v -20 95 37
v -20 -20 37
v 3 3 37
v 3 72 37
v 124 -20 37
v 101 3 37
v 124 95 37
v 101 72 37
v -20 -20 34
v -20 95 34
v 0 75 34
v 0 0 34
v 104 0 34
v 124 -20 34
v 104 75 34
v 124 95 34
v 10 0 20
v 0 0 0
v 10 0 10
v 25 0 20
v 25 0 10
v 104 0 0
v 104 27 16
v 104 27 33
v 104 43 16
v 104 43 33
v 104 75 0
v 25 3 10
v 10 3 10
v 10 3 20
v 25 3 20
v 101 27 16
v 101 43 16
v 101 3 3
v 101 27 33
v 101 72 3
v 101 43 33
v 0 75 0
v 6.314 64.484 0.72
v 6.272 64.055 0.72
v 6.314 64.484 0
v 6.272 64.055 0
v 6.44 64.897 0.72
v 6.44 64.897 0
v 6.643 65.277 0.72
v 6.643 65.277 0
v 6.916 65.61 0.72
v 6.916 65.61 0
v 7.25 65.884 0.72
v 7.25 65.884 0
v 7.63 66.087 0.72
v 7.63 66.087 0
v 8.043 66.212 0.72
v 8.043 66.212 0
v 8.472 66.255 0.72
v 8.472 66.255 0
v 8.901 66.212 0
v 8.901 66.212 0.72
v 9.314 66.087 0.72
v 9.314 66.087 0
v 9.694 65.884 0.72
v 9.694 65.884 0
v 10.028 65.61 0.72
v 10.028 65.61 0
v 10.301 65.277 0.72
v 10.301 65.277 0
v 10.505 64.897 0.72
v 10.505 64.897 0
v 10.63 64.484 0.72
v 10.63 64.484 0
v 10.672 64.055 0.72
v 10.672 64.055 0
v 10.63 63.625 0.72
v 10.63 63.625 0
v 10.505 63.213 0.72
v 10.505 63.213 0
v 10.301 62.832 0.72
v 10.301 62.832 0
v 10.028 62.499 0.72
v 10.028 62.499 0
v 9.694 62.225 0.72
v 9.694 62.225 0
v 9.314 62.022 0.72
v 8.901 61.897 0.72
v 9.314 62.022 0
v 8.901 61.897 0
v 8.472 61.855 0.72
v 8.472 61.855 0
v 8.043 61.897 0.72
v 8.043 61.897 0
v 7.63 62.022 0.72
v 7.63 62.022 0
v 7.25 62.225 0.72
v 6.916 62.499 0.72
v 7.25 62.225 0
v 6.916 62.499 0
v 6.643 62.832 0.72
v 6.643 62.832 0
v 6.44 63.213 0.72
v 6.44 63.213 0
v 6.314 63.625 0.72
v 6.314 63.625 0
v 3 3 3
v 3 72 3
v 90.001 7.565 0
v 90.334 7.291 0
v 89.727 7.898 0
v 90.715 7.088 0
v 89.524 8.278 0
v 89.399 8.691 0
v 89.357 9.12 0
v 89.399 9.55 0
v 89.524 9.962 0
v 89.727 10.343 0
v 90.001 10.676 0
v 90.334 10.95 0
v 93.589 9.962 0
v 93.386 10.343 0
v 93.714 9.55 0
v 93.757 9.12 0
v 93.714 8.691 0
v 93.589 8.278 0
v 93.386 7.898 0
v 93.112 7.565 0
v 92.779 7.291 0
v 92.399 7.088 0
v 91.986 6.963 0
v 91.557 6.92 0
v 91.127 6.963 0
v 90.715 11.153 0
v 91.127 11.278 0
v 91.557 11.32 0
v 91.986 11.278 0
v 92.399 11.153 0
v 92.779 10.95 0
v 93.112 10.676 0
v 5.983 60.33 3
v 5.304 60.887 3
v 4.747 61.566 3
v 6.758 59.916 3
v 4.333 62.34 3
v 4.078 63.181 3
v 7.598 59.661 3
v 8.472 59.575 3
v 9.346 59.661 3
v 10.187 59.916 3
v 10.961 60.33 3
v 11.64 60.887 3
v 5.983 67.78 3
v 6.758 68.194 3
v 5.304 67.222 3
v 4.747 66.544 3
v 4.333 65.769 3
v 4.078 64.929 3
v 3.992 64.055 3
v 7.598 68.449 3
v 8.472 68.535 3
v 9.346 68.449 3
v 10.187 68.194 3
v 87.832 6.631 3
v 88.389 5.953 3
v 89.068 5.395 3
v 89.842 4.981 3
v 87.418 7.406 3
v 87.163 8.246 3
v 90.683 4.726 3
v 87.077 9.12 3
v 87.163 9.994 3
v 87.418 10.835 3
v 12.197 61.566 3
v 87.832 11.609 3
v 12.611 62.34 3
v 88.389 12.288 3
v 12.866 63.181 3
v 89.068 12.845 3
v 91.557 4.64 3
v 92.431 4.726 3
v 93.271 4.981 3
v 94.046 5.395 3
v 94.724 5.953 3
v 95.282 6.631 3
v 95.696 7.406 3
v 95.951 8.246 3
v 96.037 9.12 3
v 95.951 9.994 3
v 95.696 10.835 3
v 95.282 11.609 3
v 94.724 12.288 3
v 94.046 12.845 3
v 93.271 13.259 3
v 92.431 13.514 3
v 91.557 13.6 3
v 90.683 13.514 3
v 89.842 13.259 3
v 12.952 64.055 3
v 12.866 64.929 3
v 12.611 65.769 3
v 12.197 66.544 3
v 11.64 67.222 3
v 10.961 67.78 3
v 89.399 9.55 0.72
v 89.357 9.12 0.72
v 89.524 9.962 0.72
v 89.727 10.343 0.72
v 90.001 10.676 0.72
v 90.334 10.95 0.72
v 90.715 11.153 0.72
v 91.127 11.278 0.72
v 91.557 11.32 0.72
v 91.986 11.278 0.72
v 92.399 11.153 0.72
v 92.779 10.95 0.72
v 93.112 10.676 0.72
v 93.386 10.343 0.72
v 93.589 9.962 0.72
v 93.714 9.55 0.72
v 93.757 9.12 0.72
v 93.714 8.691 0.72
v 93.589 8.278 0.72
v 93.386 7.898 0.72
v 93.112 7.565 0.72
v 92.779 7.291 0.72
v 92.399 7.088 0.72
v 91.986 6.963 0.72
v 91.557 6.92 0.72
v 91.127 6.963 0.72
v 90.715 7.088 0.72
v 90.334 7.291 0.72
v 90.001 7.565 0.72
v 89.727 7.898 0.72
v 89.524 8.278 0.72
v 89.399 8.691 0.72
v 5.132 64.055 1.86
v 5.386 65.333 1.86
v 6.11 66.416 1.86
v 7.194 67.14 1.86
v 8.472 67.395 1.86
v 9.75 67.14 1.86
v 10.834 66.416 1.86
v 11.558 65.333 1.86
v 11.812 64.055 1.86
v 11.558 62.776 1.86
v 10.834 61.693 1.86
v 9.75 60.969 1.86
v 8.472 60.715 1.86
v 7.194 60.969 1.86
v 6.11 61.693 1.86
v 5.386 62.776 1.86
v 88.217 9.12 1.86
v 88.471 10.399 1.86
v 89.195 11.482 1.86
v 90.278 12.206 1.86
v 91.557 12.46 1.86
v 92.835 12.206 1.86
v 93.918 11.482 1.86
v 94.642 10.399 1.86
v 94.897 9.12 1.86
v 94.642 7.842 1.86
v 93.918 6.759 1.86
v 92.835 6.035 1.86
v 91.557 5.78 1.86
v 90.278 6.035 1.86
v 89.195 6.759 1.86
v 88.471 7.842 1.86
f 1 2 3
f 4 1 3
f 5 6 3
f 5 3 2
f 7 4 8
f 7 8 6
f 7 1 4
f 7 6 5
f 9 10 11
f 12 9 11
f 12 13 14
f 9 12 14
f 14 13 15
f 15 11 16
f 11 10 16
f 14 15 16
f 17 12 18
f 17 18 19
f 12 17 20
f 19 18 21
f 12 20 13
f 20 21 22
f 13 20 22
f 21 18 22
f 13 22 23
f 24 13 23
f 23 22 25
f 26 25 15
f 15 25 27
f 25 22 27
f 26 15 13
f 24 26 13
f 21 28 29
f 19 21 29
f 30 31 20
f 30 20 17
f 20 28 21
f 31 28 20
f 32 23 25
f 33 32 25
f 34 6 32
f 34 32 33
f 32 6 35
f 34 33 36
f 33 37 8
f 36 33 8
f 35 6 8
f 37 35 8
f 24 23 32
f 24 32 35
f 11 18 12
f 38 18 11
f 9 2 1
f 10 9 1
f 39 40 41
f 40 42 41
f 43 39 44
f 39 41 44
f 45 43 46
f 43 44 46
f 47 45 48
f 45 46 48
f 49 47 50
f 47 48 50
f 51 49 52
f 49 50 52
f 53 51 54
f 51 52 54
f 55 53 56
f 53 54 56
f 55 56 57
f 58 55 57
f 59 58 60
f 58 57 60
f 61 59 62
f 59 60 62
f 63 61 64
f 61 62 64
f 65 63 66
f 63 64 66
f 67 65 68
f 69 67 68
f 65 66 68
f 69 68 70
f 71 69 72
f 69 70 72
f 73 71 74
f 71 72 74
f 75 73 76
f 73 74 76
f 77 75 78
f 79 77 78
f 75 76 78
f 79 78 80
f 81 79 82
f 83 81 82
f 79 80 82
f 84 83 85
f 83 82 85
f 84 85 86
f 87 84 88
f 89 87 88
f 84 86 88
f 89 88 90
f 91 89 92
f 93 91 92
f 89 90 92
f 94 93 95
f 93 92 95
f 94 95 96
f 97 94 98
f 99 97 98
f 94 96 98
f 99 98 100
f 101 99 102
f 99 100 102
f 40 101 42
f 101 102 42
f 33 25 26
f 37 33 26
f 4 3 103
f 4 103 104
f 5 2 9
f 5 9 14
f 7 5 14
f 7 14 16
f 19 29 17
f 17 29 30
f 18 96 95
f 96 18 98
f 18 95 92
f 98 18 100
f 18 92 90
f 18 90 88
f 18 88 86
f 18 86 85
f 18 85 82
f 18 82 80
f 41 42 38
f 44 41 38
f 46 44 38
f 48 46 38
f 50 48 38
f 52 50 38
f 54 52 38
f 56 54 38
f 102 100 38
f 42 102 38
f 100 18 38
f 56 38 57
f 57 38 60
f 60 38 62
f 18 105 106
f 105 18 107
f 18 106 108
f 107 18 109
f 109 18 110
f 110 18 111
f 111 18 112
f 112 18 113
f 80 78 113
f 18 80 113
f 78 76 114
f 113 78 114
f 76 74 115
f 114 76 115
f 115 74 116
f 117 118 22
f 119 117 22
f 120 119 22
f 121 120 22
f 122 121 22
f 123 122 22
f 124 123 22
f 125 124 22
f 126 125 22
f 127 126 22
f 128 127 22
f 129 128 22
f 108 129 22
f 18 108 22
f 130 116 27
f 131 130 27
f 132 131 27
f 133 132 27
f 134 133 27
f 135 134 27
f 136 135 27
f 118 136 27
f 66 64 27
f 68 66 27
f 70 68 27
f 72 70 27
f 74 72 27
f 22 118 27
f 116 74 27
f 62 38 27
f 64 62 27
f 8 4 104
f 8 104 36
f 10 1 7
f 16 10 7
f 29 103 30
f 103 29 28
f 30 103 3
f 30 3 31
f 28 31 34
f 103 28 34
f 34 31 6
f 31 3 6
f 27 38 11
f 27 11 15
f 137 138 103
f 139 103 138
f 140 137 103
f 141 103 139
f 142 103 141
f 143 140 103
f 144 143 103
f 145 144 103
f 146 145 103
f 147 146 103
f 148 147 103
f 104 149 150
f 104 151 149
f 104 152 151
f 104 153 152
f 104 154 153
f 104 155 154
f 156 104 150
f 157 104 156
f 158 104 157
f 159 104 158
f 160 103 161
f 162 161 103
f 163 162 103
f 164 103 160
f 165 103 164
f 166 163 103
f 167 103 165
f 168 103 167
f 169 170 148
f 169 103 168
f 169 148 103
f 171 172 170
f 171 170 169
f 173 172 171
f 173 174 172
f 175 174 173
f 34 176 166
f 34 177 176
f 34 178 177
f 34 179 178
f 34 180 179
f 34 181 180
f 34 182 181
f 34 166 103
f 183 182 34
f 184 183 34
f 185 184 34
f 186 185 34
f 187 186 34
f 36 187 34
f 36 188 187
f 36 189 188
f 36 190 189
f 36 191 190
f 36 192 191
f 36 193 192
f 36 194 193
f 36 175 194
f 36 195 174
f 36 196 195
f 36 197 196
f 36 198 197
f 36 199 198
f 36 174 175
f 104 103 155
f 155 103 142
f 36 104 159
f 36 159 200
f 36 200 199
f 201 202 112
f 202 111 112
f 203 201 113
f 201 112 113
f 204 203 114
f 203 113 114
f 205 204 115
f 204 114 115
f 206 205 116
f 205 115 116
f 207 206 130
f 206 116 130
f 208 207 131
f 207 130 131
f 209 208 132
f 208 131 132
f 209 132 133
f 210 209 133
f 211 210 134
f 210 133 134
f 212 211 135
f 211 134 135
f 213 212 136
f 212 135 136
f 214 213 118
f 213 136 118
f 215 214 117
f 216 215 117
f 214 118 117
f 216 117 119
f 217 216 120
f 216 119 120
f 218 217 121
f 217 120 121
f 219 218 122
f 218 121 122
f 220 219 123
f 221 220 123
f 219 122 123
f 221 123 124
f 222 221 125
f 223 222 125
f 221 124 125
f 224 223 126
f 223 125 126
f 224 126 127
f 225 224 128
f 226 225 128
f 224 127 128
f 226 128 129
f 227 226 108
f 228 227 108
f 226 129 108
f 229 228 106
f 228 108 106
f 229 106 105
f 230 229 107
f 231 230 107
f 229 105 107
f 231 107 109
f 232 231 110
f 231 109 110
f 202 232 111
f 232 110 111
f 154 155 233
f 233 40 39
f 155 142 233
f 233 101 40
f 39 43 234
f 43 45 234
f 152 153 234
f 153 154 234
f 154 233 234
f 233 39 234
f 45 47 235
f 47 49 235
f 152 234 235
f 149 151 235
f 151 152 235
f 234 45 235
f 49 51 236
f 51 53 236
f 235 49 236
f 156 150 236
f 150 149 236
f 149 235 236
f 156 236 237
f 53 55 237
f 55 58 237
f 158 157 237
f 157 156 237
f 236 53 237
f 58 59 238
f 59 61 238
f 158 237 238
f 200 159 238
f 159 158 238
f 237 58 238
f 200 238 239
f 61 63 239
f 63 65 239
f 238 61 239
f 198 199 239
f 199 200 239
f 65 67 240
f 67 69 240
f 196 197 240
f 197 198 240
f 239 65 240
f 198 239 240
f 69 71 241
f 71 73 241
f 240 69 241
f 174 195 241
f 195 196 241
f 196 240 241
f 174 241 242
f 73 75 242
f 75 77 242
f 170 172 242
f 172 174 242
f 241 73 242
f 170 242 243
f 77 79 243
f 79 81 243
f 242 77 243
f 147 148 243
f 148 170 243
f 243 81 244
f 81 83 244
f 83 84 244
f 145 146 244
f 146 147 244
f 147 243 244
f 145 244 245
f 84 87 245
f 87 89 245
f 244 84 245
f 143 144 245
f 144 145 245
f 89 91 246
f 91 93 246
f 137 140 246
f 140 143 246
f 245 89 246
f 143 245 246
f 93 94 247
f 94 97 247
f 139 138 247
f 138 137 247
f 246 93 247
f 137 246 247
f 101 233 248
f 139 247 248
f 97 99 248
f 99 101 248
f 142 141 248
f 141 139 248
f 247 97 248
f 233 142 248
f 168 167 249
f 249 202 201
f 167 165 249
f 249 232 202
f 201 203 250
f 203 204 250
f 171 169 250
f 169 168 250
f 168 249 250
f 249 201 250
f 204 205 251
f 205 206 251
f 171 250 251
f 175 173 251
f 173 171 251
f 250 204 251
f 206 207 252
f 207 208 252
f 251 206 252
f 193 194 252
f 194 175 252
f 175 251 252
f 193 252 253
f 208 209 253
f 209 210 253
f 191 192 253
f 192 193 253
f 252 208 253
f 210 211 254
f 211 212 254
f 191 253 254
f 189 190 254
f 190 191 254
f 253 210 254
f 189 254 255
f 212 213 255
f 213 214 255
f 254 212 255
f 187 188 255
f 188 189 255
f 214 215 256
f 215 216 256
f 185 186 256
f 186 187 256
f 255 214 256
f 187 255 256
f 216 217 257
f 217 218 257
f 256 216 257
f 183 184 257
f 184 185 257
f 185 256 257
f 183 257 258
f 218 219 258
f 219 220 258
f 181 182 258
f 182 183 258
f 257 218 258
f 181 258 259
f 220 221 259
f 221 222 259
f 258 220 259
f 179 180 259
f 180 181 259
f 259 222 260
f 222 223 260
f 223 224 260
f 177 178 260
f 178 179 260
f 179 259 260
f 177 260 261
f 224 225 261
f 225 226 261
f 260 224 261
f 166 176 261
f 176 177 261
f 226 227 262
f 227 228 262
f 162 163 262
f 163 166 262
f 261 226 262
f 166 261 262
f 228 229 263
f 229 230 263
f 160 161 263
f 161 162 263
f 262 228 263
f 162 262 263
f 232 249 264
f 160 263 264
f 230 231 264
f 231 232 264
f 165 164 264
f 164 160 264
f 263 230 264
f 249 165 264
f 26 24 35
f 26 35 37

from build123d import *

# Parameters (mm, degrees)
F0_W           = 104
F0_H           = 75
F1_DEPTH       = 37
F2_T           = -3
F4_D           = 4.4
F4_CSINK_D     = 8.96
F4_CSINK_ANGLE = 90
F5_D           = 4.4
F5_CSINK_D     = 8.96
F5_CSINK_ANGLE = 90
F6_W           = 15
F6_H           = 10
F7_DEPTH       = 4
F8_W           = 144
F8_H           = 115
F9_DEPTH       = 3
F10_W          = 98
F10_H          = 69
F11_DEPTH      = 3
F12_W          = 16
F12_H          = 17
F13_DEPTH      = 3


with BuildPart() as f1:
    # F0 (on Top) → F1 (new body)
    with BuildSketch(Plane.XY):
        with Locations((52, 37.5)):
            Rectangle(F0_W, F0_H)
    extrude(amount=F1_DEPTH)

    # F2
    f2_openings = [f1.faces().sort_by_distance(p)[0] for p in [
        (52, 37.5, 37),
    ]]
    offset(amount=F2_T, openings=f2_openings)

    # F4 (through all)
    with Locations(Plane.XY.offset(3)):
        with Locations((8.4720822051, 64.054608345)):
            CounterSinkHole(F4_D / 2, F4_CSINK_D / 2, counter_sink_angle=F4_CSINK_ANGLE)

    # F5 (through all)
    with Locations(Plane.XY.offset(3)):
        with Locations((91.5566533804, 9.1203558259)):
            CounterSinkHole(F5_D / 2, F5_CSINK_D / 2, counter_sink_angle=F5_CSINK_ANGLE)

    # F6 (on face) → F7 (cut)
    with BuildSketch(Plane(origin=(0, 3, 0), x_dir=(-1, 0, 0), z_dir=(0, 1, 0))):
        with Locations((-17.5, 15)):
            Rectangle(F6_W, F6_H)
    extrude(amount=-F7_DEPTH, mode=Mode.SUBTRACT)

    # F8 (on face) → F9 (join)
    with BuildSketch(Plane.XY.offset(37)):
        with Locations((52, 37.5)):
            Rectangle(F8_W, F8_H)
    extrude(amount=-F9_DEPTH)

    # F10 (on face) → F11 (cut)
    with BuildSketch(Plane.XY.offset(37)):
        with Locations((52, 37.5)):
            Rectangle(F10_W, F10_H)
    extrude(amount=-F11_DEPTH, mode=Mode.SUBTRACT)

    # F12 (on face) → F13 (cut)
    with BuildSketch(Plane.YZ.offset(104)):
        with Locations((35, 24.5)):
            Rectangle(F12_W, F12_H)
    extrude(amount=-F13_DEPTH, mode=Mode.SUBTRACT)


solid = f1.part
